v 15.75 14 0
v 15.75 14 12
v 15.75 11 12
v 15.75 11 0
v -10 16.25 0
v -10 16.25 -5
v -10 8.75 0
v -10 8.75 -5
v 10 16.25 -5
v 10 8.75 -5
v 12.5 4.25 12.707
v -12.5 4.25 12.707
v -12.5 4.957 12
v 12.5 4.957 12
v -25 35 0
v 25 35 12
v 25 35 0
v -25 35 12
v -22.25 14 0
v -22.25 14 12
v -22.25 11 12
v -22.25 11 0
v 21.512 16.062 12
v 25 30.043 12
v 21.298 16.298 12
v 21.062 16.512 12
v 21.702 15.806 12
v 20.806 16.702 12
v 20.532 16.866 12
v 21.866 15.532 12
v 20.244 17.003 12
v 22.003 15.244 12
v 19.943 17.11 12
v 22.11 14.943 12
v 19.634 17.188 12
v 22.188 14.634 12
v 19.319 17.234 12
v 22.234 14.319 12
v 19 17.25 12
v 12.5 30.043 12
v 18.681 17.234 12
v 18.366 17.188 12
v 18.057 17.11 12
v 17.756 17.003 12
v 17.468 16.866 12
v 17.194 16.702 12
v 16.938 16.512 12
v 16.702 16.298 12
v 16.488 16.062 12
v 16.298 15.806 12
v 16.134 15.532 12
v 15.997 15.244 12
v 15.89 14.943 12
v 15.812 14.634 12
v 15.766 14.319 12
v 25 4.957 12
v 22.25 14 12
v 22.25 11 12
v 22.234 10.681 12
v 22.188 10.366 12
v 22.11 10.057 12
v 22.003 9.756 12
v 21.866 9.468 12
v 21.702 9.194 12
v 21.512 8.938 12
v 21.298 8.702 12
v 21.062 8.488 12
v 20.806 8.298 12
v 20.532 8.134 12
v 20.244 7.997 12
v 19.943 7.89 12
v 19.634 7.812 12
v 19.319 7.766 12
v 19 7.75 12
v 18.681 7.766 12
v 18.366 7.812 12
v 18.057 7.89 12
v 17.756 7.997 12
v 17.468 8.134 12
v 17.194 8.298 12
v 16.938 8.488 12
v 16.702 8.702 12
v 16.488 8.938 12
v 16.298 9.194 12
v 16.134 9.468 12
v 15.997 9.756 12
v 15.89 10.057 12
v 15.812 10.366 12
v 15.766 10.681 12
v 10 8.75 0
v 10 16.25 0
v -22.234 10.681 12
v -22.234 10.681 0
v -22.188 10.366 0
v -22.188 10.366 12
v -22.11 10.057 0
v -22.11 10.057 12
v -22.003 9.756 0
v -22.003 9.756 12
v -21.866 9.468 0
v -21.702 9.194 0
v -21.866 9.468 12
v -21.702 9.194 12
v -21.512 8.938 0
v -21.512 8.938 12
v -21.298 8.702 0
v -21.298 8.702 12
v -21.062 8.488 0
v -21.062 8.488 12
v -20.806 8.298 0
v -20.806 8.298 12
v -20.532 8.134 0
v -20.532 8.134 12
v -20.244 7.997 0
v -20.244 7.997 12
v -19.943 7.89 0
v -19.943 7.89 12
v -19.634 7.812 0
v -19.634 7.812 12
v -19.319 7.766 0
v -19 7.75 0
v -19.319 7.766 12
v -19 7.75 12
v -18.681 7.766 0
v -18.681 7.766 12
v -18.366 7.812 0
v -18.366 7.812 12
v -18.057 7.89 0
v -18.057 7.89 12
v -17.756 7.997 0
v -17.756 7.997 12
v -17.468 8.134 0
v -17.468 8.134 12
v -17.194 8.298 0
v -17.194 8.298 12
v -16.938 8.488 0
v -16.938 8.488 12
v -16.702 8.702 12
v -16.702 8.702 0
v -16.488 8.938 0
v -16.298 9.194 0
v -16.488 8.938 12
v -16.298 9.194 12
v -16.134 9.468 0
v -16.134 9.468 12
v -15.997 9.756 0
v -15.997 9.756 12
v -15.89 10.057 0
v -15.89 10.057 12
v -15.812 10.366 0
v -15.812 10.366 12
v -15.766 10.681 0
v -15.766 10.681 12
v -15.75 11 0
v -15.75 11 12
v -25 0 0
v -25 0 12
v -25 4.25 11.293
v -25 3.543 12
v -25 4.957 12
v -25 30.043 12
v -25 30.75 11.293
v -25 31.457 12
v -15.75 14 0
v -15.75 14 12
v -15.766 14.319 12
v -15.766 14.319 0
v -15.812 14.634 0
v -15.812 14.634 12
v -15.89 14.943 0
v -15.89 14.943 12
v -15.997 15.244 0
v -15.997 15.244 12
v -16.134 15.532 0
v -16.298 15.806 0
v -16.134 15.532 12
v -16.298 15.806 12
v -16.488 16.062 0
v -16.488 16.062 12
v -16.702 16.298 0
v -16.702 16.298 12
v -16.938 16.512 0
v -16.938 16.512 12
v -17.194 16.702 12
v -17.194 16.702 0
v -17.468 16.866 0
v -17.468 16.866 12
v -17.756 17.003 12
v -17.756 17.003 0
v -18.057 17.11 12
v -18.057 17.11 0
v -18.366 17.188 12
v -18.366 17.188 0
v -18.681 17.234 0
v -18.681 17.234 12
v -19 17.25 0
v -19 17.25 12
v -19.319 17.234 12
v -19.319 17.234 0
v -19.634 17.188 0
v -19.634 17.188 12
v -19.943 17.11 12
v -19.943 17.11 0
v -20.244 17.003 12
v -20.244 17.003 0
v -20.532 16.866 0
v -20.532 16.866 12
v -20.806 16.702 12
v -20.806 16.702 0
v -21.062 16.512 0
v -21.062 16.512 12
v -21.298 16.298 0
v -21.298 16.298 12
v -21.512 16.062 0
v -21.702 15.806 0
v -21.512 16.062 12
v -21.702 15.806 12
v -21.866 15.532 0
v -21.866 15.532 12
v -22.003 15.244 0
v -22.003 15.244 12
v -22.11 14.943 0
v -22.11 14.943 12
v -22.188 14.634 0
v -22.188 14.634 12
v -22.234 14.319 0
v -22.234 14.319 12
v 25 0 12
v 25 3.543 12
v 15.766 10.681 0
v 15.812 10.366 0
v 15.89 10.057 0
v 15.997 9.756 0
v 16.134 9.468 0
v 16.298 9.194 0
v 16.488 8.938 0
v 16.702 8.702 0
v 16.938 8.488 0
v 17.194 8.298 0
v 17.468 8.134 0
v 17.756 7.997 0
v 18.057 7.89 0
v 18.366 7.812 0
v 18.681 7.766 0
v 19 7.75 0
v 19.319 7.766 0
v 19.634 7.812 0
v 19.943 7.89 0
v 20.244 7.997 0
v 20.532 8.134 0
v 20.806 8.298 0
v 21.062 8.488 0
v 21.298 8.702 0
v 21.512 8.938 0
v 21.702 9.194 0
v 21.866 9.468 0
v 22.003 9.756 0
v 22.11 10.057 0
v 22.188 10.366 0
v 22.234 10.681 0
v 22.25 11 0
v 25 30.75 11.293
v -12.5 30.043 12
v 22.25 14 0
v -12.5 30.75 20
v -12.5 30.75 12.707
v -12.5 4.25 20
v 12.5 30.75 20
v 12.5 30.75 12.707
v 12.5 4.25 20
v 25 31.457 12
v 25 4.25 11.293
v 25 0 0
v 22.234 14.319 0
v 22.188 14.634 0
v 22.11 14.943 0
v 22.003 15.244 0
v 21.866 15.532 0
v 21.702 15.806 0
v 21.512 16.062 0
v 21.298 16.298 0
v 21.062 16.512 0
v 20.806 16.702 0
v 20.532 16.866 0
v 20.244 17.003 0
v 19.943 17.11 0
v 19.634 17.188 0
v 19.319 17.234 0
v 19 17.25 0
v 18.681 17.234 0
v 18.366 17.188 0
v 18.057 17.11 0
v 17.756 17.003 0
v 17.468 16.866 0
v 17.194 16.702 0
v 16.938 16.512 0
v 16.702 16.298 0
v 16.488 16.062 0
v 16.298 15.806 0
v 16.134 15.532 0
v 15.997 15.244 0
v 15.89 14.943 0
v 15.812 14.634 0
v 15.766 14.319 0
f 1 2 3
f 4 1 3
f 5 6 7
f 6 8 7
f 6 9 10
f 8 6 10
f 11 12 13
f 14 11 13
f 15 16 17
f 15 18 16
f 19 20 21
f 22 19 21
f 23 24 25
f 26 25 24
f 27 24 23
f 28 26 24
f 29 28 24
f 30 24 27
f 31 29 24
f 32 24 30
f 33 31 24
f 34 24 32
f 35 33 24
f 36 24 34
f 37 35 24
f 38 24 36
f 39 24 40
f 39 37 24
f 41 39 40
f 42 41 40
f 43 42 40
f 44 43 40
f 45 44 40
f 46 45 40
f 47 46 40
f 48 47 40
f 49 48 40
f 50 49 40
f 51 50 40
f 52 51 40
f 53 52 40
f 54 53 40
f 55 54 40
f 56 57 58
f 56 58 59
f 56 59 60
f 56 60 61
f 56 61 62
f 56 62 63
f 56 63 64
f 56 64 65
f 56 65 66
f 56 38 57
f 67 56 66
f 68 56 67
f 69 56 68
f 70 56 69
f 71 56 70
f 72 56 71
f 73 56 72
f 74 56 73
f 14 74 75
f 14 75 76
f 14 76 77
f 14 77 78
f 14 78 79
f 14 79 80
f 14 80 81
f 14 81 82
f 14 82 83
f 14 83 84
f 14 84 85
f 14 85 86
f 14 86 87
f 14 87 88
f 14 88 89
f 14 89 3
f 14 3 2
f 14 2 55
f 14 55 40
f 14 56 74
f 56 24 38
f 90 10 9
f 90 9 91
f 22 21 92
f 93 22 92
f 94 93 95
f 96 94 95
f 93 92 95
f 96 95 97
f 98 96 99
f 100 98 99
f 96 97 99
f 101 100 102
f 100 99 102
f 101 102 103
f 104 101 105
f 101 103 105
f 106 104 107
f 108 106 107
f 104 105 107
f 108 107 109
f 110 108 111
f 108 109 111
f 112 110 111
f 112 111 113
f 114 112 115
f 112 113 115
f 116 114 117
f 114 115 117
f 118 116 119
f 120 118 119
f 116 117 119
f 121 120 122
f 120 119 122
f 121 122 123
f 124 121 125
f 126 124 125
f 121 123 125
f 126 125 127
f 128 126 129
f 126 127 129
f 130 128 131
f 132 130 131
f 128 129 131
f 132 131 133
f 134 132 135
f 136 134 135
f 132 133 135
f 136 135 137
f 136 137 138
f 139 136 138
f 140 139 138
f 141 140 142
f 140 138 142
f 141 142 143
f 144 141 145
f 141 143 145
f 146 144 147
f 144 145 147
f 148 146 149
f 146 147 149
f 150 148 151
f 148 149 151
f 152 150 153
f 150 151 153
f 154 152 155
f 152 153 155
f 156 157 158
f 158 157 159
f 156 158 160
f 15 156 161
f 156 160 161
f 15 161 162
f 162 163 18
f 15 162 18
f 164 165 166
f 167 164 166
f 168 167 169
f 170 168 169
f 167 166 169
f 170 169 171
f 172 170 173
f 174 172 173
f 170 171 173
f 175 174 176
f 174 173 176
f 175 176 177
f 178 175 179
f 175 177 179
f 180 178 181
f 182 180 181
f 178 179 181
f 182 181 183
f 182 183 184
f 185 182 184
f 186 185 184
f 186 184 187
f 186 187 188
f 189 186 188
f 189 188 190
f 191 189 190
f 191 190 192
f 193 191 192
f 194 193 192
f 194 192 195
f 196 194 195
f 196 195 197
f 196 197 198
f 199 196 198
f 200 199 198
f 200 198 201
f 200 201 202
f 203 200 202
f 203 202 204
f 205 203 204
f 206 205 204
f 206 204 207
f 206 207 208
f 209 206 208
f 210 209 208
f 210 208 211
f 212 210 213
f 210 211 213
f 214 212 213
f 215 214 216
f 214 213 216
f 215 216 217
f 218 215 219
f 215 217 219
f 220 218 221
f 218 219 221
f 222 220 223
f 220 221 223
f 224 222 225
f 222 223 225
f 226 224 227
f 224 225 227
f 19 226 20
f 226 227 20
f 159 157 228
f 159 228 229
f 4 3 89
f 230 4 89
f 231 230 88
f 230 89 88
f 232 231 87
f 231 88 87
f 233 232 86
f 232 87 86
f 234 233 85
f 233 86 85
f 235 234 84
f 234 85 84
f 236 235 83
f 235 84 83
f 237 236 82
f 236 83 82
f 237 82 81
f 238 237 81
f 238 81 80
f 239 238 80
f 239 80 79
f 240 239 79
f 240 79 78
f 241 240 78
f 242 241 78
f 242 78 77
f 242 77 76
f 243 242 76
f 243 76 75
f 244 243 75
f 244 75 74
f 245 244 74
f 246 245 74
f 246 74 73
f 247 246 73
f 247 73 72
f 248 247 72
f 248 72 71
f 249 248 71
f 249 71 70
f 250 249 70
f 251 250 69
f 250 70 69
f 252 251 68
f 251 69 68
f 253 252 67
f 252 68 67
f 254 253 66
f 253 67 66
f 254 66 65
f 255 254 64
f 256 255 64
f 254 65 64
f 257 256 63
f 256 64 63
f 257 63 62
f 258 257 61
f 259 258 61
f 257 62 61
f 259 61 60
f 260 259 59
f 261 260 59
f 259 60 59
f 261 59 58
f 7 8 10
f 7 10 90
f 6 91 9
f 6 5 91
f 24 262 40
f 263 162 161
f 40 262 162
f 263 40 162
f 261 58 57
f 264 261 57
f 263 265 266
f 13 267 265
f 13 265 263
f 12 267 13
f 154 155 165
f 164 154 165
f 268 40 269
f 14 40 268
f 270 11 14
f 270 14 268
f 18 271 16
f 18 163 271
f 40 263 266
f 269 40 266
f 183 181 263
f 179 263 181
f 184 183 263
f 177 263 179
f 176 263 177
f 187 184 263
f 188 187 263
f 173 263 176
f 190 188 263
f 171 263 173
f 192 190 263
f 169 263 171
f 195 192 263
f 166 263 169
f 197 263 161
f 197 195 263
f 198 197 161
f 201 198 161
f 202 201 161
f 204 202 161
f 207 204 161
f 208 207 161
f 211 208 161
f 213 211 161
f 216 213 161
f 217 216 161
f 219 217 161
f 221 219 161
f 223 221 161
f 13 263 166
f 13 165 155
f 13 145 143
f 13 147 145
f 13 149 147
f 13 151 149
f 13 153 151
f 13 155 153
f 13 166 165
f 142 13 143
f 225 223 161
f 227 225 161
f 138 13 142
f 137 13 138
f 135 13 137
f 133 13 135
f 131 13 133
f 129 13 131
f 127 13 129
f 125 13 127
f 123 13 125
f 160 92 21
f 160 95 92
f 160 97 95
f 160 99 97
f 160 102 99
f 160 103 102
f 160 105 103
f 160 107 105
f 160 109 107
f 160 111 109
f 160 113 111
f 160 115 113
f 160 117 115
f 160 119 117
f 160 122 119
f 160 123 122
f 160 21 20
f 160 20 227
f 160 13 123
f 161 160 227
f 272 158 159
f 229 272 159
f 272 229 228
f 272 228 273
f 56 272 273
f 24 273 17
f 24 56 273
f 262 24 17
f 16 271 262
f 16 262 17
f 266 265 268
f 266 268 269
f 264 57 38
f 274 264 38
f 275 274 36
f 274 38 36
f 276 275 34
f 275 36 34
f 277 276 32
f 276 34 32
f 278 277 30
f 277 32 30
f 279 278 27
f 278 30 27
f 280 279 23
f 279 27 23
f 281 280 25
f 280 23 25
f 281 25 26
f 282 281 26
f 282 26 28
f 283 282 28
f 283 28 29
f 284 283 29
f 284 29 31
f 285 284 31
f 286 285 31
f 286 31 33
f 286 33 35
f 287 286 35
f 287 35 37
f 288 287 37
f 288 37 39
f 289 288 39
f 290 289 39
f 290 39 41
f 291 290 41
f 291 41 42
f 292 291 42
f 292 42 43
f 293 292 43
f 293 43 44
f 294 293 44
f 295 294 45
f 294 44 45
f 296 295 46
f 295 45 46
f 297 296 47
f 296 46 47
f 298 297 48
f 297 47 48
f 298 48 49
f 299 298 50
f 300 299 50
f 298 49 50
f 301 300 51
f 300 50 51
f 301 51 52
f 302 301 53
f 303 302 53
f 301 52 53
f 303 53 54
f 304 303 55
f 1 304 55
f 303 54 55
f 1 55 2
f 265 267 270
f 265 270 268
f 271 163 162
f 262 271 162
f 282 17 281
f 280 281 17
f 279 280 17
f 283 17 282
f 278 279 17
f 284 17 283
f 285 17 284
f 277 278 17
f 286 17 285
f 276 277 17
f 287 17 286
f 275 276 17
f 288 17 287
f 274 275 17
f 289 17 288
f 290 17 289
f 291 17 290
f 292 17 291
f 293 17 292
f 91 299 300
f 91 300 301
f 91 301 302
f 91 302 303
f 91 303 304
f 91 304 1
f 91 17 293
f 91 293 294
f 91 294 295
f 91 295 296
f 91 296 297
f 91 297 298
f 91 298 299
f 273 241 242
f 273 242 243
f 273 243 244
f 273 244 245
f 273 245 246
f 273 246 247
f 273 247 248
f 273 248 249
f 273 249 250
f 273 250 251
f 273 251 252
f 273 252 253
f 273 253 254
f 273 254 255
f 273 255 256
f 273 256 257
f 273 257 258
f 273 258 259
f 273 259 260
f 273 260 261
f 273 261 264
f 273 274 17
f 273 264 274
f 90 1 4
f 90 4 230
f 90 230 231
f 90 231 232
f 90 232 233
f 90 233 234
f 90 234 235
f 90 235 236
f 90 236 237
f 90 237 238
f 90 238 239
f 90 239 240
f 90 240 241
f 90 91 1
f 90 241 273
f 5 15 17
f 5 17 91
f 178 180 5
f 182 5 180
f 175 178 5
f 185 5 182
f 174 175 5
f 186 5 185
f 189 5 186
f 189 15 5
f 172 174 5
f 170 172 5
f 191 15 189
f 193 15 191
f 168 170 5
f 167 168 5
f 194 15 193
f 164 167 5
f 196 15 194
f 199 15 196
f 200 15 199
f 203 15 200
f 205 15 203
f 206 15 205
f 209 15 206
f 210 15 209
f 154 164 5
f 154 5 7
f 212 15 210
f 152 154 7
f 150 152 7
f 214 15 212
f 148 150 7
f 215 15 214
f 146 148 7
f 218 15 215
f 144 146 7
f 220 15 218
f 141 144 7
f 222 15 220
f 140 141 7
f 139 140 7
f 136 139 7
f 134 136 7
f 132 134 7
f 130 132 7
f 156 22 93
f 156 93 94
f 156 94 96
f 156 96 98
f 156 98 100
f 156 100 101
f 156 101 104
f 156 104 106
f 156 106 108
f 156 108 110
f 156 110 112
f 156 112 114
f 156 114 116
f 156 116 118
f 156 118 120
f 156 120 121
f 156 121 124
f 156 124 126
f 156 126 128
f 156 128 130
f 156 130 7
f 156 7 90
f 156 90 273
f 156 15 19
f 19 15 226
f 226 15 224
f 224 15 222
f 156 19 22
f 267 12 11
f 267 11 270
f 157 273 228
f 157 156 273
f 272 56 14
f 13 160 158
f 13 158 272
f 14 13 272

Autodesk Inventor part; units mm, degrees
ref_plane "YZ Plane" through (0, 0, 0) normal (1, 0, 0) x (0, 1, 0)
ref_plane "XZ Plane" through (0, 0, 0) normal (0, 1, 0) x (-1, 0, 0)
ref_plane "XY Plane" through (0, 0, 0) normal (0, 0, 1) x (1, 0, 0)
sketch "Sketch1" plane through (0, 0, 0) normal (1, 0, 0) x (0, 1, 0)
  line L0 (4.25, 20) -> (30.75, 20)
  line L1 (30.75, 20) -> (30.75, 12)
  line L2 (30.75, 12) -> (35, 12)
  line L3 (35, 12) -> (35, 0)
  line L4 (35, 0) -> (16.25, 0)
  line L5 (16.25, 0) -> (16.25, -5)
  line L6 (16.25, -5) -> (8.75, -5)
  line L7 (8.75, -5) -> (8.75, 0)
  line L8 (8.75, 0) -> (0, 0)
  line L9 (0, 0) -> (0, 12)
  line L10 (0, 12) -> (4.25, 12)
  line L11 (4.25, 12) -> (4.25, 20)
  line L12 (3.5429, 12) -> (4.25, 12.7071)
  line L13 (4.25, 12.7071) -> (4.9571, 12)
  line L14 (4.9571, 12) -> (4.25, 11.2929)
  line L15 (4.25, 11.2929) -> (3.5429, 12)
  line L16 (30.75, 12.7071) -> (31.4571, 12)
  line L17 (31.4571, 12) -> (30.75, 11.2929)
  line L18 (30.75, 11.2929) -> (30.0429, 12)
  line L19 (30.0429, 12) -> (30.75, 12.7071)
  dimension "d0" = 35
  dimension "d3" = 7.5
  dimension "d4" = 8
  dimension "d5" = 25
  dimension "d6" = 5
  dimension "d7" = 22
  dimension "d9" = 12
  dimension "d11" = 4.25
  dimension "d12" = 4.25
  dimension "d19" = 1
  dimension "d20" = 0.5
  dimension "d21" = 0.5
  dimension "d22" = 1
  dimension "d23" = 45
extrude "Extrusion1" add sketch "Sketch1" along normal mid plane 50 contours L0 L1 L19 L18 L17 L2 L3 L4 L5 L6 L7 L8 L9 L10 L15 L14 L13 L11
sketch "Sketch2" plane through (-25, 0, 0) normal (0, -1, 0) x (1, 0, 0)
  line L0 (0, 20) -> (12.5, 20)
  line L1 (12.5, 20) -> (12.5, 12)
  line L2 (12.5, 12) -> (0, 12)
  line L3 (0, 12) -> (0, 20)
  line L4 (37.5, 20) -> (50, 20)
  line L5 (50, 20) -> (50, 12)
  line L6 (50, 12) -> (37.5, 12)
  line L7 (37.5, 12) -> (37.5, 20)
  line L8 (50, -5) -> (35, -5)
  line L9 (35, -5) -> (35, 0)
  line L10 (35, 0) -> (50, 0)
  line L11 (50, 0) -> (50, -5)
  line L12 (0, -5) -> (15, -5)
  line L13 (15, -5) -> (15, 0)
  line L14 (15, 0) -> (0, 0)
  line L15 (0, 0) -> (0, -5)
  line L16 (0, -5) -> (50, -5) projected
  line L17 (50, 0) -> (50, -5) projected
  line L18 (50, 20) -> (0, 20) projected
  line L19 (0, 12.7071) -> (0, 20) projected
  line L20 (0, 12) -> (50, 12) projected
  line L21 (25, 0) -> (50, 0) projected
  dimension "d15" = 25
  dimension "d16" = 20
extrude "Extrusion2" cut sketch "Sketch2" against normal through all contours L0 L1 L2 L3 | L4 L5 L6 L7 | L12 L15 L14 L13 | L8 L9 L10 L11
sketch "Sketch4" plane through (12.5, 30.0429, 12) normal (0, 0, 1) x (1, 0, 0)
  line L0 (-31.5, -19.0429) -> (-31.5, -16.0429) construction
  line L1 (-28.25, -19.0429) -> (-28.25, -16.0429)
  line L2 (-34.75, -16.0429) -> (-34.75, -19.0429)
  arc A0 (-34.75, -19.0429) -> (-28.25, -19.0429) centre (-31.5, -19.0429) ccw
  arc A1 (-28.25, -16.0429) -> (-34.75, -16.0429) centre (-31.5, -16.0429) ccw
  line L3 (-37.5, -25.0858) -> (-37.5, 0) projected
  line L4 (-22.5, -21.2929) -> (-2.5, -21.2929) projected
  point P0 (-31.5, -17.5429)
  dimension "d24" = 6.5
  dimension "d25" = 3
  dimension "d26" = 6
  dimension "d27" = 3.75
extrude "Extrusion3" cut sketch "Sketch4" against normal through all
mirror "Mirror1" about plane through (0, 0, 0) normal (1, 0, 0) of "Extrusion3"
equation "\"d21\" = d20"
equation "\"d22\" = d19"
equation "\"d27\" = 0.5 * d3"
properties part number "Holding Block" material "Aluminum 6061"
